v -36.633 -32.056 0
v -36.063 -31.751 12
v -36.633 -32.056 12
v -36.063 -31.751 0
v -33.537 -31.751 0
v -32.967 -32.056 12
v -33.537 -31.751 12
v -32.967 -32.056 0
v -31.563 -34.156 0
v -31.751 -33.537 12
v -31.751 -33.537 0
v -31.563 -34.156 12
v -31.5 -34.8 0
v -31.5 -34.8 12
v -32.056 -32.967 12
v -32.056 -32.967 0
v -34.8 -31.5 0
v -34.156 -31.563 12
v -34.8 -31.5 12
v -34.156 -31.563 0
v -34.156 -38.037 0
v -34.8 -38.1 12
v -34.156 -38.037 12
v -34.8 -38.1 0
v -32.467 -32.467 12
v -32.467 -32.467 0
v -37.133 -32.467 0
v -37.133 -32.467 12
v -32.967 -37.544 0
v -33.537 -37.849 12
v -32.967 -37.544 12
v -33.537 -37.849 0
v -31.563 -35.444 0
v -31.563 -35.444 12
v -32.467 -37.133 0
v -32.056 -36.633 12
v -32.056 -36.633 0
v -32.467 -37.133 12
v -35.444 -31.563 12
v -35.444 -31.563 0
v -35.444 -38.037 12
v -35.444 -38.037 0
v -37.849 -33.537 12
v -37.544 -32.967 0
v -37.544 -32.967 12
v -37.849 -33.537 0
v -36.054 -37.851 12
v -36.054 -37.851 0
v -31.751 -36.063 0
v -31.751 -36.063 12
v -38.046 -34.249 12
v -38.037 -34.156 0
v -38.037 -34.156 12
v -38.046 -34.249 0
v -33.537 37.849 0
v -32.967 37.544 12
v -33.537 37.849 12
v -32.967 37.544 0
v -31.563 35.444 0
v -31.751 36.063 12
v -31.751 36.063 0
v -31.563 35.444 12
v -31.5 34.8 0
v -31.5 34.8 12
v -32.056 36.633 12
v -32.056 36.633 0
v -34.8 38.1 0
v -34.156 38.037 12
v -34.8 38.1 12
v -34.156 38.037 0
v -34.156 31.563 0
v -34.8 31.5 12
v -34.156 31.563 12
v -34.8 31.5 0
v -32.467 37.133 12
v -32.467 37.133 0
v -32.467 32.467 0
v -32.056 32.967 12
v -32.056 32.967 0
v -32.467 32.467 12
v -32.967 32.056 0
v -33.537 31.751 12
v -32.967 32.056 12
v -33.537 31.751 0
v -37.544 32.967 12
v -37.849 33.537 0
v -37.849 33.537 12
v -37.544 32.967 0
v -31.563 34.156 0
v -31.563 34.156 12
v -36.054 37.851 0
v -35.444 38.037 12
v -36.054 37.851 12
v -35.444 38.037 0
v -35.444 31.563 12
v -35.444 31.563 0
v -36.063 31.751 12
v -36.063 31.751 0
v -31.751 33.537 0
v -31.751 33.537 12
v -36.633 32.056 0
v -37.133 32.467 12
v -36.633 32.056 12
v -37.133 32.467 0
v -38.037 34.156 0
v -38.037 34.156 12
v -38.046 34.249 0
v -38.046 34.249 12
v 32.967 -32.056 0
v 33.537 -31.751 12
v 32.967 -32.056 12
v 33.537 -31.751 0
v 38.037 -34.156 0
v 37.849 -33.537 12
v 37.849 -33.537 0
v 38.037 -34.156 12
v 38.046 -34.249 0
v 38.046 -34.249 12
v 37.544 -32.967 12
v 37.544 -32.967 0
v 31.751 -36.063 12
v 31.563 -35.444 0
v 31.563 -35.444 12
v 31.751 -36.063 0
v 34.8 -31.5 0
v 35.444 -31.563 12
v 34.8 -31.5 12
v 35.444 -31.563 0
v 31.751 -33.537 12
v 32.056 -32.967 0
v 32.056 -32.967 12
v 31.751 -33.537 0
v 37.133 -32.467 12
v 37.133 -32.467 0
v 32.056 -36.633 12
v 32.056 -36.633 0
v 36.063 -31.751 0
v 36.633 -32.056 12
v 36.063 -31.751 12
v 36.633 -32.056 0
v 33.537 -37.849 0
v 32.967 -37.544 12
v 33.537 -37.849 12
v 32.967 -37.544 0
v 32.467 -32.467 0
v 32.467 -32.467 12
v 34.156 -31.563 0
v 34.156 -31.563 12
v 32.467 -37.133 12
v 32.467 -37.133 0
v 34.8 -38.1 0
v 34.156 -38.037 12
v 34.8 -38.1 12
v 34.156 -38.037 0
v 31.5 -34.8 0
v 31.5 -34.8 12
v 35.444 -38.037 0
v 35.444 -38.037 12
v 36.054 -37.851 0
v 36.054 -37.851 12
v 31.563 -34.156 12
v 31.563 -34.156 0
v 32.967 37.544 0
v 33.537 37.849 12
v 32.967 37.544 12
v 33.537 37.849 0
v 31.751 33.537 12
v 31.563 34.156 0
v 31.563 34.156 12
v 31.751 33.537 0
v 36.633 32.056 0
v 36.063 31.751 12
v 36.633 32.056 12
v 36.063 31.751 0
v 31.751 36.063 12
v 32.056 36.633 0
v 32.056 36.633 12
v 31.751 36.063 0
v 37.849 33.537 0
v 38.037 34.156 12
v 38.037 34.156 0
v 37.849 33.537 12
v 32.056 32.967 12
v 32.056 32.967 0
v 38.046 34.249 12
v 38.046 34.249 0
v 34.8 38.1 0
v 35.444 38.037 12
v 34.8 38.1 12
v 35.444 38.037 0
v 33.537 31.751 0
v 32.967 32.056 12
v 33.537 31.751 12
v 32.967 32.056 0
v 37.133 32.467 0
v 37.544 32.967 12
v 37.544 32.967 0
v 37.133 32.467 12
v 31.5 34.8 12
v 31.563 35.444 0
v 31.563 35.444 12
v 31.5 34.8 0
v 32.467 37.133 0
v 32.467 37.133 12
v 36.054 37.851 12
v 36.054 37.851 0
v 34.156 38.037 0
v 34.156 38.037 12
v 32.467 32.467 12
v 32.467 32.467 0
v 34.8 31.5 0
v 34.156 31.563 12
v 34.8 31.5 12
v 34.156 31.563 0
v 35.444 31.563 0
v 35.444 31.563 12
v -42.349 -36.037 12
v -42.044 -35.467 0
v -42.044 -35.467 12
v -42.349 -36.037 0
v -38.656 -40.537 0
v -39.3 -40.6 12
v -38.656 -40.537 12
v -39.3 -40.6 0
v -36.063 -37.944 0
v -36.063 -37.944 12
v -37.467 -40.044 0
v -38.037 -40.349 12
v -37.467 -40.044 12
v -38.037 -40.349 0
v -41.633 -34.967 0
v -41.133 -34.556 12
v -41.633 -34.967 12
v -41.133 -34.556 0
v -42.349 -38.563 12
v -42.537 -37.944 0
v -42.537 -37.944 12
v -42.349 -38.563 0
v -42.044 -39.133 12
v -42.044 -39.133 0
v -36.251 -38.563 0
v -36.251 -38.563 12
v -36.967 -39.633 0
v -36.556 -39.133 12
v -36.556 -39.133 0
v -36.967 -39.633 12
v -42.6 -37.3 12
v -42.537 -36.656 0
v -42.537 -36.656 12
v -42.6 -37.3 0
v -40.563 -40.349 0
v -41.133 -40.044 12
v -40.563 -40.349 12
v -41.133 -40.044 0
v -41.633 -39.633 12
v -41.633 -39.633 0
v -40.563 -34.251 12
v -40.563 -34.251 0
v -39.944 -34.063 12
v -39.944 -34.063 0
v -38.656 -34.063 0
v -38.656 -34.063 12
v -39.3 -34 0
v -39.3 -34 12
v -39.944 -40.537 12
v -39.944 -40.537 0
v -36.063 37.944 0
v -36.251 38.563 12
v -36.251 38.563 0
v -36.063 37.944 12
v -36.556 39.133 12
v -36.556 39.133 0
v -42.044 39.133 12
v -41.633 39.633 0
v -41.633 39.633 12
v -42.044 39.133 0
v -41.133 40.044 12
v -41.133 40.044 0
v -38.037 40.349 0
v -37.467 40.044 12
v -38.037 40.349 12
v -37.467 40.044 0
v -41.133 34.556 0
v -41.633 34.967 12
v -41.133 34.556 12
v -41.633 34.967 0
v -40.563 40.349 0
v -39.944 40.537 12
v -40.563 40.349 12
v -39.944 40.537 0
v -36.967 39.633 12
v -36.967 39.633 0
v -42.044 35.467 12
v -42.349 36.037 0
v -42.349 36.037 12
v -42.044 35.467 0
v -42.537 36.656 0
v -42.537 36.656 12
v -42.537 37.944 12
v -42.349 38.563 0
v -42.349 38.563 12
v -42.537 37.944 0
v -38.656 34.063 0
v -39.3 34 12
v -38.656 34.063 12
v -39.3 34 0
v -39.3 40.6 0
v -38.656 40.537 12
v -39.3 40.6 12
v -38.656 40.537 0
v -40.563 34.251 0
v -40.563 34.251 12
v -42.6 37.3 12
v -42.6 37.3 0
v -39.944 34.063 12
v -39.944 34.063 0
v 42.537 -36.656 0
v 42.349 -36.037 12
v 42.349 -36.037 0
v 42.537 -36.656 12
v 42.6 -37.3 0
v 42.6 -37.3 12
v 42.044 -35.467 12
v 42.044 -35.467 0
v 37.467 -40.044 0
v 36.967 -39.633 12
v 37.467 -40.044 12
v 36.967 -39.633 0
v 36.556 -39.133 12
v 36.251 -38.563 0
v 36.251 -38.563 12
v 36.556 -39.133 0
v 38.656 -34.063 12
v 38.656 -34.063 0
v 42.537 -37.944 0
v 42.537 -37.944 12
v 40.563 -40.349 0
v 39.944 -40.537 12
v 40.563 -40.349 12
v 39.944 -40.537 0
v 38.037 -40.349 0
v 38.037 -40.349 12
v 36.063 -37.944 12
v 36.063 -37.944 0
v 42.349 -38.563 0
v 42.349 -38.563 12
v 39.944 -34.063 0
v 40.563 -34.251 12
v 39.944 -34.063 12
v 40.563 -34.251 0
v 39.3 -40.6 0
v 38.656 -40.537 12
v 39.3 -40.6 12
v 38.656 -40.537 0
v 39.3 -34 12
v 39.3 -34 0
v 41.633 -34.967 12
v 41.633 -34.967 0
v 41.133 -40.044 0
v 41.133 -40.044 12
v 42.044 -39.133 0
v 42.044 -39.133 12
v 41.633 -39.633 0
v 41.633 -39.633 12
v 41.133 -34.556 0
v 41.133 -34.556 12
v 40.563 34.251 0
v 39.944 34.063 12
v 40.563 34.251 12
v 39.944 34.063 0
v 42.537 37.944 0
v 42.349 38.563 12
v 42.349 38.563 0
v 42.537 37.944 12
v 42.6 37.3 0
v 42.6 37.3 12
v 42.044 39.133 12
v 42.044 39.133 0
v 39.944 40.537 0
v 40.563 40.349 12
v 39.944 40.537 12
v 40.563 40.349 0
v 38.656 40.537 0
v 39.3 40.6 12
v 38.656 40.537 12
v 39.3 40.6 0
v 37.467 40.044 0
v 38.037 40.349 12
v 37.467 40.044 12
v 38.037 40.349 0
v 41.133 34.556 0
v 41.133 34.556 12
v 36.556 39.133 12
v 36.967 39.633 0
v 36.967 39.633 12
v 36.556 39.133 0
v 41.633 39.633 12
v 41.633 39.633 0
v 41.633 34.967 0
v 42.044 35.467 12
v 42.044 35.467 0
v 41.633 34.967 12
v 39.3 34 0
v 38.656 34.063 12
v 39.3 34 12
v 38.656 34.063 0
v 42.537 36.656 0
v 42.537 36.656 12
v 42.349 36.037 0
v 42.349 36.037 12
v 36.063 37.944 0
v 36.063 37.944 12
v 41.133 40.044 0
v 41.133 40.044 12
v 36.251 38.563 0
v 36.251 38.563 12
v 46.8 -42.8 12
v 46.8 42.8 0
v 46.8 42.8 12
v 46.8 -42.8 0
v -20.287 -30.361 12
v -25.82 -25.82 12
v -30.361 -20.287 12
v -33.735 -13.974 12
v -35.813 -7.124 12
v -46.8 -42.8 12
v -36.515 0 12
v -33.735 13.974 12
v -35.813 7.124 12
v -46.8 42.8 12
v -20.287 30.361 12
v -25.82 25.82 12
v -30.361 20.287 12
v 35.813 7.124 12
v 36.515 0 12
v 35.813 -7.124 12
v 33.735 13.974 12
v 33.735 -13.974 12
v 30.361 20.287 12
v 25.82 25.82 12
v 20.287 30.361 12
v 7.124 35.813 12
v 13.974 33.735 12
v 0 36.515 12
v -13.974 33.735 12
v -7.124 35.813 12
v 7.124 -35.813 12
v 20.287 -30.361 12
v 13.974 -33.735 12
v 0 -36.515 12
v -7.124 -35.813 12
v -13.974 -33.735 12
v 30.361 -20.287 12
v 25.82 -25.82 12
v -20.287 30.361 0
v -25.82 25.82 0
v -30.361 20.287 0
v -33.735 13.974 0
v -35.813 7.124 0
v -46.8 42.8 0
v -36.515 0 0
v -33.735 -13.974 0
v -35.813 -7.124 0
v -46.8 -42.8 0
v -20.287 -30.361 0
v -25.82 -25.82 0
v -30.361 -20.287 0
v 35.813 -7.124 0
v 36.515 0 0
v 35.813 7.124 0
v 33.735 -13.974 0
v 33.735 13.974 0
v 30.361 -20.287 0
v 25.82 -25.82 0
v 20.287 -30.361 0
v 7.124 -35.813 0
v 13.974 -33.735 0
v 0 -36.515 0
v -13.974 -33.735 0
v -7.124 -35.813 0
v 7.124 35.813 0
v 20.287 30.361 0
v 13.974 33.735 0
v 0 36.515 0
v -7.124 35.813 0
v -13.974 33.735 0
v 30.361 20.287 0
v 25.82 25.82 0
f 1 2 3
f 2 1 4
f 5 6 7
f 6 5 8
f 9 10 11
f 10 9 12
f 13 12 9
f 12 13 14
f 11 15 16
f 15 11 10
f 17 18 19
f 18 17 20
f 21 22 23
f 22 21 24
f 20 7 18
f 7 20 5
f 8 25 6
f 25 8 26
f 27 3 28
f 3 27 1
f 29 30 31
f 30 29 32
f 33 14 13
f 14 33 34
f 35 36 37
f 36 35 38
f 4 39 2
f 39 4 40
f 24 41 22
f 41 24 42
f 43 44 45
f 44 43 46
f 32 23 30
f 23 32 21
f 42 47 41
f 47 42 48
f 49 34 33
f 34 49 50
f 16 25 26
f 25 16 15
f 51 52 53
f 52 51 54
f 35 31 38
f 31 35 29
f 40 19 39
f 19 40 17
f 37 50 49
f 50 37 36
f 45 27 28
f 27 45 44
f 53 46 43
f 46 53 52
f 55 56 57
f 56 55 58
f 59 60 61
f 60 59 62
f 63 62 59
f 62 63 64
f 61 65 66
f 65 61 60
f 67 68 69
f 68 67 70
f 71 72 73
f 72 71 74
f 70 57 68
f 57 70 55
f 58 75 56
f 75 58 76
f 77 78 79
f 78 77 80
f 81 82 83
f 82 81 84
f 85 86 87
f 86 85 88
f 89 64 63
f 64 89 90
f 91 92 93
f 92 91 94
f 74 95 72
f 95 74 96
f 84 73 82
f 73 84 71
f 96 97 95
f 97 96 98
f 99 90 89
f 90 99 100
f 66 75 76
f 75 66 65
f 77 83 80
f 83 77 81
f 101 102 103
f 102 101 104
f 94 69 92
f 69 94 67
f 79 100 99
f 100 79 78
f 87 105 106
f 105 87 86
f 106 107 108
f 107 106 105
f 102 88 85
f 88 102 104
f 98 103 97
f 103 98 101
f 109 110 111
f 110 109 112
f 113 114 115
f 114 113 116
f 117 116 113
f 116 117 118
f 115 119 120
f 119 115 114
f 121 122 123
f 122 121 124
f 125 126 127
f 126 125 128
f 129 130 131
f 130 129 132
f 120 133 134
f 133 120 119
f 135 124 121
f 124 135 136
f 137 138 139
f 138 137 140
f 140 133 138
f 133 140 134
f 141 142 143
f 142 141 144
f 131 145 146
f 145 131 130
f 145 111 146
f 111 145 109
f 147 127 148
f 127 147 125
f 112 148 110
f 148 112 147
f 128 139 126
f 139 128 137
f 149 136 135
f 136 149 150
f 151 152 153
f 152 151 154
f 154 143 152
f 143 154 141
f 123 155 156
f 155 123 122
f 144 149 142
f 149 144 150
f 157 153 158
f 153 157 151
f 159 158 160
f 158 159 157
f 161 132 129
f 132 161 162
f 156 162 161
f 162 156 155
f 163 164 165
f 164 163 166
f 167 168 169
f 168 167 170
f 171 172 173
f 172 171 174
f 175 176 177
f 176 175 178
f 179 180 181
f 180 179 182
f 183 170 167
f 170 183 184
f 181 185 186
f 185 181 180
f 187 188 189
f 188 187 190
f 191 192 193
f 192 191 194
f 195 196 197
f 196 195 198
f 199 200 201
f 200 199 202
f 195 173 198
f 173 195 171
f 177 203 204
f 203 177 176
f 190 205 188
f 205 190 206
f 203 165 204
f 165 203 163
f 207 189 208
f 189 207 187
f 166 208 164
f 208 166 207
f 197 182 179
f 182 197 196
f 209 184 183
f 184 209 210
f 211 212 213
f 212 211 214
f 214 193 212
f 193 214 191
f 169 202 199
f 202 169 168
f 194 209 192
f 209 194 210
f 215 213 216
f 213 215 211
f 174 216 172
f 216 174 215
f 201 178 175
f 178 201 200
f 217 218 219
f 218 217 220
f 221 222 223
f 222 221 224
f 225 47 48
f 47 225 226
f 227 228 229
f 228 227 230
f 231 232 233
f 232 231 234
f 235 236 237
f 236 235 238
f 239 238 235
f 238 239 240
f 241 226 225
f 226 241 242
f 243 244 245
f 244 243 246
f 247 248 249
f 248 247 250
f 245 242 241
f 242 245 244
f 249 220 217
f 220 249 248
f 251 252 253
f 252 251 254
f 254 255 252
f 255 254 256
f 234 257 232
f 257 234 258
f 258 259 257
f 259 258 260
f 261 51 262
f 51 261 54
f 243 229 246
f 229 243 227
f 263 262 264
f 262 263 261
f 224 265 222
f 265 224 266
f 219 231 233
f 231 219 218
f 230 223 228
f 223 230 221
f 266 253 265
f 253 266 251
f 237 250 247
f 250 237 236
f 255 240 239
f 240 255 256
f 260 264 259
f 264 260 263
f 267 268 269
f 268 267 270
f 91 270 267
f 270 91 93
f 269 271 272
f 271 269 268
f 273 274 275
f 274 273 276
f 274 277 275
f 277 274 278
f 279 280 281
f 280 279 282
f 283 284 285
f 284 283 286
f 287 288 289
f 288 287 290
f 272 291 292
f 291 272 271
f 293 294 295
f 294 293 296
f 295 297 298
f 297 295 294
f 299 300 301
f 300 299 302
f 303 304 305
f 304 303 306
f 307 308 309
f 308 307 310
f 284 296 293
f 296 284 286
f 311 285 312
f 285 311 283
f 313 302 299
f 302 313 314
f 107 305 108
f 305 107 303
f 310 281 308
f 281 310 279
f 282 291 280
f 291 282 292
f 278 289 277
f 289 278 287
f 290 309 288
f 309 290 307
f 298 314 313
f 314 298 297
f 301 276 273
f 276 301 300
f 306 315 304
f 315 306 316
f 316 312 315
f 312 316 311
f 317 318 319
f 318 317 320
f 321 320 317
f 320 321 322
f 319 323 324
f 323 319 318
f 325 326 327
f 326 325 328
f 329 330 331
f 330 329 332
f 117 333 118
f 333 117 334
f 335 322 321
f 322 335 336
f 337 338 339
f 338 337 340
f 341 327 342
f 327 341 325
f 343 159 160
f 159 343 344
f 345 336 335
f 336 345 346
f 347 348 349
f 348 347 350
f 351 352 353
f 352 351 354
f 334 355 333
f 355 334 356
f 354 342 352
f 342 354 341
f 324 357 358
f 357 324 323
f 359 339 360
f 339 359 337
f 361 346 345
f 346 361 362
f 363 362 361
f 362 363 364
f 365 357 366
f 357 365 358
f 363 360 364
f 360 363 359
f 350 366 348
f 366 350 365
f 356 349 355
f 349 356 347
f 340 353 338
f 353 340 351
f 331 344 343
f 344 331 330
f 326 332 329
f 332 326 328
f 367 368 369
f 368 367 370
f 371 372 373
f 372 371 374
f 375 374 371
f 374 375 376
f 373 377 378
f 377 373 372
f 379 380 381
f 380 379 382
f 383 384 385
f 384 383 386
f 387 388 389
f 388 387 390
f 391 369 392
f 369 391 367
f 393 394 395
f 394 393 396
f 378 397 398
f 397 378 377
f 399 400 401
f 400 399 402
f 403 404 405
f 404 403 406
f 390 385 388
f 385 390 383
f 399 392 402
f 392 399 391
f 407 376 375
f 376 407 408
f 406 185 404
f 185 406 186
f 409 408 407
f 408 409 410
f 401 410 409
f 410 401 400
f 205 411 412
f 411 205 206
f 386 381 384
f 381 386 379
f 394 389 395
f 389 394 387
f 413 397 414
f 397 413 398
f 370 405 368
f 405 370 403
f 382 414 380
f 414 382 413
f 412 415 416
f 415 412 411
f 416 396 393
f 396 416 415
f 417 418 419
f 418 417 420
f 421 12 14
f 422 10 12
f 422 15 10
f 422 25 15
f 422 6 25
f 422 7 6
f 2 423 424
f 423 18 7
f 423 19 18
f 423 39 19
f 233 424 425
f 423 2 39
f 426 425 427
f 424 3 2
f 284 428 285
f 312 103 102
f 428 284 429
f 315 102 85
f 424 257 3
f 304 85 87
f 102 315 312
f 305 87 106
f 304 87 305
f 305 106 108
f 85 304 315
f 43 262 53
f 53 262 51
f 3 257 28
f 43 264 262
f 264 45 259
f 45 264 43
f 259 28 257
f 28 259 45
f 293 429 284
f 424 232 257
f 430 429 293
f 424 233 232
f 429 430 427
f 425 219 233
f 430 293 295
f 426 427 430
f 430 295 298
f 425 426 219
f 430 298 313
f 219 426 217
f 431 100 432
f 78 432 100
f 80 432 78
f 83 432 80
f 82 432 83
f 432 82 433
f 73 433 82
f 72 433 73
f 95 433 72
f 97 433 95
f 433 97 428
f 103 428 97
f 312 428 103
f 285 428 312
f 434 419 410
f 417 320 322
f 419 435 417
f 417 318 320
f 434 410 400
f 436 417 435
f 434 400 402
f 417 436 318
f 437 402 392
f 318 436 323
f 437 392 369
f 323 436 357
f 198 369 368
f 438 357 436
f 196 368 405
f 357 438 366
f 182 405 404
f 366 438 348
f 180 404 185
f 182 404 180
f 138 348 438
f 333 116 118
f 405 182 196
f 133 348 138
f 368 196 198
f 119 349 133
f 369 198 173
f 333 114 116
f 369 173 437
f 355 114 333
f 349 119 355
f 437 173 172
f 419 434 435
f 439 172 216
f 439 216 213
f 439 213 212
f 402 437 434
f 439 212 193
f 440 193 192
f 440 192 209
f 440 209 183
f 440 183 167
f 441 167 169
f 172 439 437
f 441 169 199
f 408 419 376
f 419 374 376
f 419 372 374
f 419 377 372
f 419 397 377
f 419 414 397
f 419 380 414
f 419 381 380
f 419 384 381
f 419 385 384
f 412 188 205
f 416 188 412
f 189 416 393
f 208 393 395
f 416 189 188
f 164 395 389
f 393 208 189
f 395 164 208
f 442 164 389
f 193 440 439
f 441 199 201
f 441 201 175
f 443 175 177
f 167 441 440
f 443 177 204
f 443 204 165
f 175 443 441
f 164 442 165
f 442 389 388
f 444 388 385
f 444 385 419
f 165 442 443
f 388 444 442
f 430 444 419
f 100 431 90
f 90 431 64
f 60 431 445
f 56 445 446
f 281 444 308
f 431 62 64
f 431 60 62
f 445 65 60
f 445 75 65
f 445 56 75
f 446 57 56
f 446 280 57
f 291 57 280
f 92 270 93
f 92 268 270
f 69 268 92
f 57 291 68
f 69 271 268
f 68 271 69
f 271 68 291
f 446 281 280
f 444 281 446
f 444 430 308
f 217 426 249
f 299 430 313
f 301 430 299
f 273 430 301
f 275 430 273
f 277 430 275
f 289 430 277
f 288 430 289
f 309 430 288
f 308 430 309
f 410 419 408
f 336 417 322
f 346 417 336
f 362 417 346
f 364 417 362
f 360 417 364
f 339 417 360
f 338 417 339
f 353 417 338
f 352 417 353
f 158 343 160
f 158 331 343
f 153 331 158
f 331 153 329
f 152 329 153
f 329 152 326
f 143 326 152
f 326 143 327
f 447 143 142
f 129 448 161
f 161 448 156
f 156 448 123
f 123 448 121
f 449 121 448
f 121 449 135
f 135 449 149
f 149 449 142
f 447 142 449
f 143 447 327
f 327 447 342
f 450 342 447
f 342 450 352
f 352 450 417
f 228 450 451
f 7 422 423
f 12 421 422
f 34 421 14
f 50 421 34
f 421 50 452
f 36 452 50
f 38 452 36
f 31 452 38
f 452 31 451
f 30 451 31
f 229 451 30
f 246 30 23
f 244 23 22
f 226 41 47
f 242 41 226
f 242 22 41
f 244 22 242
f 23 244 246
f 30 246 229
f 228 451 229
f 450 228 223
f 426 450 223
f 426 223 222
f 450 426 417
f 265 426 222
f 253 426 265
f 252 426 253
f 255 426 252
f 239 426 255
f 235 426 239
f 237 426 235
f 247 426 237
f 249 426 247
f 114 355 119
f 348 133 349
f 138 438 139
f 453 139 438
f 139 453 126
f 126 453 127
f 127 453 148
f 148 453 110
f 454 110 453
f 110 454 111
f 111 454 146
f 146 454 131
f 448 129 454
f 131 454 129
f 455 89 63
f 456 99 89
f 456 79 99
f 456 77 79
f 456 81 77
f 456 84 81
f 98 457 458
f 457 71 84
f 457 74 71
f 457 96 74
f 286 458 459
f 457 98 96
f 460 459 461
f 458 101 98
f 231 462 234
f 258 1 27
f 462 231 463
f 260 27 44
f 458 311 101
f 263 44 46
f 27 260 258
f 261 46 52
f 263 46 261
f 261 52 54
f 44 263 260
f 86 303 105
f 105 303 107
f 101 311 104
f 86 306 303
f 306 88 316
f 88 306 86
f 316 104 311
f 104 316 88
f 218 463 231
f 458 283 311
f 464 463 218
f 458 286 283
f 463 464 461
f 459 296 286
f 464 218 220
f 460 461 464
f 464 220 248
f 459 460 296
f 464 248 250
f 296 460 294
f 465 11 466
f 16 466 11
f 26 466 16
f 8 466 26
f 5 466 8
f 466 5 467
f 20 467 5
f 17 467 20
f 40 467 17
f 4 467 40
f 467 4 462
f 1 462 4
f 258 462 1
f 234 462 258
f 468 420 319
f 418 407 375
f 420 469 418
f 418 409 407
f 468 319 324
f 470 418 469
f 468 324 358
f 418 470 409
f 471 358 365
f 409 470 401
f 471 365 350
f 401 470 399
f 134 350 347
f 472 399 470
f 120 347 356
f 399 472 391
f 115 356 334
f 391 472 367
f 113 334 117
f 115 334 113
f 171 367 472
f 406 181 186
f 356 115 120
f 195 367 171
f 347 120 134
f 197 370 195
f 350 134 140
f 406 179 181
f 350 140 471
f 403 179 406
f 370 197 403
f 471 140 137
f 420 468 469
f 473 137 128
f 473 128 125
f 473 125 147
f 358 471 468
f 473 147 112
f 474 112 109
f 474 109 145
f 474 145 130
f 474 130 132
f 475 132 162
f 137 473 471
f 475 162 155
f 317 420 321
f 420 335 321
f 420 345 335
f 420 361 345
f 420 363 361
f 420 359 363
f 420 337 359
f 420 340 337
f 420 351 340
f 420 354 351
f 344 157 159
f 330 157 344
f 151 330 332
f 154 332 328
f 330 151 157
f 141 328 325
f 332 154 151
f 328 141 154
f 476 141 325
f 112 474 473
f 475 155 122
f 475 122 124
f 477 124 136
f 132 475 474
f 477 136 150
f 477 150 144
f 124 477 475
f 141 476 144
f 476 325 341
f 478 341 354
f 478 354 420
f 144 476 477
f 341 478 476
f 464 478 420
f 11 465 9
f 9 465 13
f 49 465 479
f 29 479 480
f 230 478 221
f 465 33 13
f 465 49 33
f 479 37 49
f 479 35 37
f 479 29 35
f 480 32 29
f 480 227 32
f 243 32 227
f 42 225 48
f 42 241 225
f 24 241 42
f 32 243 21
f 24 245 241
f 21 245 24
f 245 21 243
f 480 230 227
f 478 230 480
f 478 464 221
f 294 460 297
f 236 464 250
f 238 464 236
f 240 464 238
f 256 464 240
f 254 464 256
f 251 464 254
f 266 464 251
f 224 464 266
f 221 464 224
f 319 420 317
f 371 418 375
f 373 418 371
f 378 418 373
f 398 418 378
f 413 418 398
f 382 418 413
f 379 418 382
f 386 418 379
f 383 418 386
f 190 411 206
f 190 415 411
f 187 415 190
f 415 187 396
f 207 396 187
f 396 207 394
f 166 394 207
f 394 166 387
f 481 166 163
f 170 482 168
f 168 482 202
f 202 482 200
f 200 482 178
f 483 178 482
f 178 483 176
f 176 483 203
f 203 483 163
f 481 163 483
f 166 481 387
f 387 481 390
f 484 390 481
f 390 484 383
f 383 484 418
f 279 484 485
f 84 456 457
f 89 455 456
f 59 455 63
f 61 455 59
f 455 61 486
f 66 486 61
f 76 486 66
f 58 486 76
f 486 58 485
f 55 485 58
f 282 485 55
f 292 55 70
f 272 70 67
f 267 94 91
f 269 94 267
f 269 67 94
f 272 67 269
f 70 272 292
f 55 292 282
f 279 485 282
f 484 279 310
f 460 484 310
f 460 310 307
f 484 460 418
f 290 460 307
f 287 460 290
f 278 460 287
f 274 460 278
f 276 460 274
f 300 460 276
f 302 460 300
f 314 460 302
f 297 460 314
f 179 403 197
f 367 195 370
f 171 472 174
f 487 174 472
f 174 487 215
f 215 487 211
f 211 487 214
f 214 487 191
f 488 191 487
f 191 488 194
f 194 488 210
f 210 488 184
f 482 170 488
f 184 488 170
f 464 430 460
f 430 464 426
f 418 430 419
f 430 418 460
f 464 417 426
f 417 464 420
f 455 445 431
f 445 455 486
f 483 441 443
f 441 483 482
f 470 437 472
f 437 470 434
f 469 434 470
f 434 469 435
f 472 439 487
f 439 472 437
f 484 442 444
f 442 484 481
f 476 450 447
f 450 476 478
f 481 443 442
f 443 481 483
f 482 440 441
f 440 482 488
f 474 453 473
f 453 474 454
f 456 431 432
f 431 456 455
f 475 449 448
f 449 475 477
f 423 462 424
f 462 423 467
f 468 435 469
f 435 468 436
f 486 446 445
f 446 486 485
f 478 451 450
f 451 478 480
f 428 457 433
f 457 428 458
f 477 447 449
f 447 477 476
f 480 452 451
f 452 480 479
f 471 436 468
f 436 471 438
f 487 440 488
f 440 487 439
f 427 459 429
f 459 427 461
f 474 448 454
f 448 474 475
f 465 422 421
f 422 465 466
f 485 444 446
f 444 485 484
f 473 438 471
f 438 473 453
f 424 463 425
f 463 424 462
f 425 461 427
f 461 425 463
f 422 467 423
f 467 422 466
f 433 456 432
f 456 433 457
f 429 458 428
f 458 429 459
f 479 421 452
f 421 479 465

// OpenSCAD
$fn = 32;

// ----------------------------------------------------------------------
// Motor mount plate: NEMA34, 93.6 x 85.6 x 12 mm
// ----------------------------------------------------------------------

// --- parameters (mm) ---
mount_w = 93.6;           // plate length, X
mount_d = 85.6;           // plate width, Y
mat_t = 12;               // plate thickness
motor_pitch = 69.6;       // NEMA34 bolt spacing
motor_d = 6.6;            // NEMA34 screw clearance
center_bore = 73.03;      // pilot boss bore
second_d = 6.6;           // second fastener hole

module plate() {
  translate([-mount_w / 2, -mount_d / 2, 0]) cube([mount_w, mount_d, mat_t]);
}

module motor_holes() {
  for (sx = [-1, 1]) for (sy = [-1, 1])
    translate([sx * motor_pitch / 2, sy * motor_pitch / 2, -1])
      cylinder(h = mat_t + 2, d = motor_d);
}

difference() {
  union() {
    plate();
  }
  motor_holes();
  translate([0, 0, -1]) cylinder(h = mat_t + 2, d = center_bore);
  for (sx = [-1, 1]) for (sy = [-1, 1])
    translate([sx * 39.3, sy * 37.3, -1]) cylinder(h = mat_t + 2, d = second_d);
}
